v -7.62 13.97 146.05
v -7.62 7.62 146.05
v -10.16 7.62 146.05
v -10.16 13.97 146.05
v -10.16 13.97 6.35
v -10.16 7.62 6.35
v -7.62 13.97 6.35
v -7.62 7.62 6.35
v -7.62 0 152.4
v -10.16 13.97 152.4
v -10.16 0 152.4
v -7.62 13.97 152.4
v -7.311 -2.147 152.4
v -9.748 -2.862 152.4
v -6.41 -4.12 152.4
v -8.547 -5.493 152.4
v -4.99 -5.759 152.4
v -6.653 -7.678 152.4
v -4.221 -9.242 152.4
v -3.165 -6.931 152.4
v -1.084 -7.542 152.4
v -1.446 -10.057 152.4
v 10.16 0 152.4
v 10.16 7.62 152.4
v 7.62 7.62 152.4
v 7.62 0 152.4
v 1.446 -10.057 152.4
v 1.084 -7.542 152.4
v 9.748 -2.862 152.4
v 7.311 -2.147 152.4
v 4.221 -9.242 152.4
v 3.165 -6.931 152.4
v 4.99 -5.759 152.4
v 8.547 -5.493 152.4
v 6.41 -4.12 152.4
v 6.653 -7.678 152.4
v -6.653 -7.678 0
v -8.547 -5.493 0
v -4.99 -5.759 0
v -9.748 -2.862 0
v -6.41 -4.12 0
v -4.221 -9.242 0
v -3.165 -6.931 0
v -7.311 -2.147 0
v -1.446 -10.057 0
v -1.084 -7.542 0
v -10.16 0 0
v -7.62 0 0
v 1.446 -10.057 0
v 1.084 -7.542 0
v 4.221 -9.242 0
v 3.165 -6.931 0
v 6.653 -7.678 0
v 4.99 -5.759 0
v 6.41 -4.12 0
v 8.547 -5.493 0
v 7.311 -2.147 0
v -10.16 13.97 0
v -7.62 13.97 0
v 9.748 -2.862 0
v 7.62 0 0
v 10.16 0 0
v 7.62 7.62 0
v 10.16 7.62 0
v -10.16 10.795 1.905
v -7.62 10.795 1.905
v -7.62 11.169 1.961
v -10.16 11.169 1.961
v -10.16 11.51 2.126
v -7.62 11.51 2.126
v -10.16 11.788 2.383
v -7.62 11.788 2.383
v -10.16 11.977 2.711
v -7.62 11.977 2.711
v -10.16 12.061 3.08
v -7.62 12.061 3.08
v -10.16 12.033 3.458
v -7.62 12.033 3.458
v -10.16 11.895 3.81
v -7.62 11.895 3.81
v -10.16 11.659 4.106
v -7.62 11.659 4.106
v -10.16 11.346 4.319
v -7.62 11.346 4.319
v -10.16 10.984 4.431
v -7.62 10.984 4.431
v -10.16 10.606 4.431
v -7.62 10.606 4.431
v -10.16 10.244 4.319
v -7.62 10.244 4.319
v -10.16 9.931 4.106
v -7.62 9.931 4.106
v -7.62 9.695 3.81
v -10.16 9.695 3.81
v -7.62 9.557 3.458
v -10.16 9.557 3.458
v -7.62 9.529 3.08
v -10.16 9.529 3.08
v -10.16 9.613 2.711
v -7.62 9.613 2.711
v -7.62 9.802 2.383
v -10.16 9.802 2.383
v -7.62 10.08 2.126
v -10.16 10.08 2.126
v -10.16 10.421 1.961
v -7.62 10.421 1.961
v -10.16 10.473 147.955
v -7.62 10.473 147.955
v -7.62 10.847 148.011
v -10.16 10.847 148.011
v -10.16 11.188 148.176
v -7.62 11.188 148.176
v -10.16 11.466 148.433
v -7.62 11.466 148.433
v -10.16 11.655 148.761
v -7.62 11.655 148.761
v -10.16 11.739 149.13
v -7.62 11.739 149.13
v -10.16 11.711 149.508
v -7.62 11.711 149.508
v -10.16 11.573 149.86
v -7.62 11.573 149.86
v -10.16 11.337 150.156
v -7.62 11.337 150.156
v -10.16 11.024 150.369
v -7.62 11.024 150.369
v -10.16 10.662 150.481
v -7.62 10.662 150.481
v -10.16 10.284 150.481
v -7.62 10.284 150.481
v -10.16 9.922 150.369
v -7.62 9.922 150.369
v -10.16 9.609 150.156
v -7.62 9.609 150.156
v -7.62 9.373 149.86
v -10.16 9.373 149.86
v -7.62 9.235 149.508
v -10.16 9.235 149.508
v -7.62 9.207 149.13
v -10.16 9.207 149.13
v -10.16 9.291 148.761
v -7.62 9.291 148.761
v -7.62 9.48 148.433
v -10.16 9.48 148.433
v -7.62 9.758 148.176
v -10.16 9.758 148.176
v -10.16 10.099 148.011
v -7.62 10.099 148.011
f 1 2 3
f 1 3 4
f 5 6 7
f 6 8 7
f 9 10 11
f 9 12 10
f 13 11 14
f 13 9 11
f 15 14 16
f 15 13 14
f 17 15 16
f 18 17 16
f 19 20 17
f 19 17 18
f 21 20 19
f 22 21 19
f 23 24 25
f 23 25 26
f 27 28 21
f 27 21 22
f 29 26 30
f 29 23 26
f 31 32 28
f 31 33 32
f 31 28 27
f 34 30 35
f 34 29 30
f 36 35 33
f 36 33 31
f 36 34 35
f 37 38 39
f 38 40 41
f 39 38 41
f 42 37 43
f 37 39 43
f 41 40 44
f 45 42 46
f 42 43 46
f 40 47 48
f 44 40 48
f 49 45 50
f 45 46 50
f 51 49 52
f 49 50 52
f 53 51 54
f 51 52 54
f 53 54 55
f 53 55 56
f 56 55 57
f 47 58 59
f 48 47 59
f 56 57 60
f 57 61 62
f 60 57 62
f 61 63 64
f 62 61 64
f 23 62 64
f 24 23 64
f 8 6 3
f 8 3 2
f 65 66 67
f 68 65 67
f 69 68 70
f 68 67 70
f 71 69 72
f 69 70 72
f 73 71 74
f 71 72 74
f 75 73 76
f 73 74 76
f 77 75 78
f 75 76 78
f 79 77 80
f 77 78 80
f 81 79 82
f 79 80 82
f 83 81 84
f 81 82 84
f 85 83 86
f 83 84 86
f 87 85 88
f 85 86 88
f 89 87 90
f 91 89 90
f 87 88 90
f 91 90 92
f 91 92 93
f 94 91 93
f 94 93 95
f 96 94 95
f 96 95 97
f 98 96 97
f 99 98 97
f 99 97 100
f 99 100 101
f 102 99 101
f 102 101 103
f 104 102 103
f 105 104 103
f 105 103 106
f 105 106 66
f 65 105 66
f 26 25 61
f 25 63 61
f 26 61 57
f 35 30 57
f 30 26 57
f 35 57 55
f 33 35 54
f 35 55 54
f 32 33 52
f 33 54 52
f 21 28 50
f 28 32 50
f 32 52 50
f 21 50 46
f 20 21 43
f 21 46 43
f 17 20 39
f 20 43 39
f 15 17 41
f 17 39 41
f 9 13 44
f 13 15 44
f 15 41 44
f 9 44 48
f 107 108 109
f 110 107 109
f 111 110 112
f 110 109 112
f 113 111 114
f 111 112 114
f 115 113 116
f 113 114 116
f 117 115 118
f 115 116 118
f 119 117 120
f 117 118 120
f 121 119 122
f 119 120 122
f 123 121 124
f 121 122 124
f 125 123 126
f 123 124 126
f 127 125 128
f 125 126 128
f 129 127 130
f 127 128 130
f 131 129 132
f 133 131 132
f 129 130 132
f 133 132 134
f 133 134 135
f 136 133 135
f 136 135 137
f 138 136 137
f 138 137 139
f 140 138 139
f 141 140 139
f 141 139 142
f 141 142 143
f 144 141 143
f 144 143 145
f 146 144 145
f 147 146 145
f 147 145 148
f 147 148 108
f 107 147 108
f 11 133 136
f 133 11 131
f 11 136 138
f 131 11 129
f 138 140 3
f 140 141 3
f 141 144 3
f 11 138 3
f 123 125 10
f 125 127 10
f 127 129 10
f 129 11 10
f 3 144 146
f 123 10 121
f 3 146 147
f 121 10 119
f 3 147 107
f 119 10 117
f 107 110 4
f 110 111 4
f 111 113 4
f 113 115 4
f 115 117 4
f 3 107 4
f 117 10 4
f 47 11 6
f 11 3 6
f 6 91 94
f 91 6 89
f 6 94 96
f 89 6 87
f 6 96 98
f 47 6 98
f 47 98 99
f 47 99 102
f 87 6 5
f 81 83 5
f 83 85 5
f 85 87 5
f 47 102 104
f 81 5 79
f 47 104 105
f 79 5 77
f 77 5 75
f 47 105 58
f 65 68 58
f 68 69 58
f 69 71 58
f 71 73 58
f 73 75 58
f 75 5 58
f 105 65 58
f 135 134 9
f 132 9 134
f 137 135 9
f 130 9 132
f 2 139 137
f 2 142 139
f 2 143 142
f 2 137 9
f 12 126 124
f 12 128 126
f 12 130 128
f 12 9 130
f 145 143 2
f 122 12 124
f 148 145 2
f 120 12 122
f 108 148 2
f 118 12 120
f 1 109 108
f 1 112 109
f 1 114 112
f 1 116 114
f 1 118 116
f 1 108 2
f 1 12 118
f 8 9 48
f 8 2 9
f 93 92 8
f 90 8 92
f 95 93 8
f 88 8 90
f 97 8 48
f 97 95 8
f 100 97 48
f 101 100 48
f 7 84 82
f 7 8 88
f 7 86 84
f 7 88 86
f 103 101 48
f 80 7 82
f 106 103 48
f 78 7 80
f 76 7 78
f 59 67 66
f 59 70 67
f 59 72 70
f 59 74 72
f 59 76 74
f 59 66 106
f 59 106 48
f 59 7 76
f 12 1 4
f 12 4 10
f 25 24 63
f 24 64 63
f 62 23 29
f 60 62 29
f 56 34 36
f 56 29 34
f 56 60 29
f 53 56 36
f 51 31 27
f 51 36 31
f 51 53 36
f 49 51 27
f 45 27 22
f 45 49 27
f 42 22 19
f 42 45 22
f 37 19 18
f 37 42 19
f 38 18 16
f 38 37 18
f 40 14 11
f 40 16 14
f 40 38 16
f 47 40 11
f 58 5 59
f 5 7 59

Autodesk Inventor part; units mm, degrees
ref_plane "YZ Plane" through (0, 0, 0) normal (1, 0, 0) x (0, 1, 0)
ref_plane "XZ Plane" through (0, 0, 0) normal (0, 1, 0) x (-1, 0, 0)
ref_plane "XY Plane" through (0, 0, 0) normal (0, 0, 1) x (1, 0, 0)
sketch "Sketch1" plane through (0, 0, 0) normal (0, 0, 1) x (1, 0, 0)
  circle A0 centre (0, 0) radius 7.62
  line L0 (-10.16, 7.62) -> (-10.16, 0)
  arc A1 (-10.16, 0) -> (10.16, 0) centre (0, 0) ccw
  line L1 (10.16, 0) -> (10.16, 7.62)
  line L2 (10.16, 7.62) -> (7.62, 7.62)
  line L3 (7.62, 7.62) -> (7.62, 0)
  line L4 (-10.16, 7.62) -> (-7.62, 7.62)
  line L5 (-7.62, 7.62) -> (-7.62, 0)
  dimension "d0" = 15.24
  dimension "d1" = 2.54
  dimension "d2" = 2.54
  dimension "d3" = 2.54
extrude "Extrusion1" add sketch "Sketch1" along normal blind 152.4 contours L3 L2 L1 A1 L0 L4 L5 A0
sketch "Sketch2" plane through (-7.62, 0, 0) normal (1, 0, 0) x (0, 0, -1)
  line L0 (0, 7.62) -> (-152.4, 7.62) projected
  line L1 (0, 7.62) -> (-6.35, 7.62)
  line L2 (-6.35, 7.62) -> (-6.35, 13.97)
  line L3 (-6.35, 13.97) -> (0, 13.97)
  line L4 (0, 13.97) -> (0, 7.62)
  circle A0 centre (-3.175, 10.795) radius 1.27
  point P0 (0, 0)
  dimension "d6" = 6.35
  dimension "d7" = 6.35
  dimension "d8" = 2.54
  dimension "d9" = 3.175
  dimension "d10" = 3.175
extrude "Extrusion2" add sketch "Sketch2" against normal up to surface (2.54 mm away)
sketch "Sketch4" plane through (-7.62, 0, 152.4) normal (1, 0, 0) x (0, 0, -1)
  line L0 (0, 0) -> (0, 7.62) projected
  circle A0 centre (3.175, 10.473) radius 1.27
  line L1 (152.4, 7.62) -> (0, 7.62) projected
  line L2 (6.35, 7.62) -> (0, 7.62)
  line L3 (0, 7.62) -> (6.35, 7.62)
  line L4 (6.35, 7.62) -> (6.35, 13.97)
  line L5 (6.35, 13.97) -> (0, 13.97)
  line L6 (0, 13.97) -> (0, 7.62)
  point P0 (152.4, 0)
  dimension "d15" = 2.54
  dimension "d16" = 6.35
  dimension "d17" = 6.35
extrude "Extrusion3" add sketch "Sketch4" against normal up to surface (2.54 mm away)
properties part number "StraightTrack"
